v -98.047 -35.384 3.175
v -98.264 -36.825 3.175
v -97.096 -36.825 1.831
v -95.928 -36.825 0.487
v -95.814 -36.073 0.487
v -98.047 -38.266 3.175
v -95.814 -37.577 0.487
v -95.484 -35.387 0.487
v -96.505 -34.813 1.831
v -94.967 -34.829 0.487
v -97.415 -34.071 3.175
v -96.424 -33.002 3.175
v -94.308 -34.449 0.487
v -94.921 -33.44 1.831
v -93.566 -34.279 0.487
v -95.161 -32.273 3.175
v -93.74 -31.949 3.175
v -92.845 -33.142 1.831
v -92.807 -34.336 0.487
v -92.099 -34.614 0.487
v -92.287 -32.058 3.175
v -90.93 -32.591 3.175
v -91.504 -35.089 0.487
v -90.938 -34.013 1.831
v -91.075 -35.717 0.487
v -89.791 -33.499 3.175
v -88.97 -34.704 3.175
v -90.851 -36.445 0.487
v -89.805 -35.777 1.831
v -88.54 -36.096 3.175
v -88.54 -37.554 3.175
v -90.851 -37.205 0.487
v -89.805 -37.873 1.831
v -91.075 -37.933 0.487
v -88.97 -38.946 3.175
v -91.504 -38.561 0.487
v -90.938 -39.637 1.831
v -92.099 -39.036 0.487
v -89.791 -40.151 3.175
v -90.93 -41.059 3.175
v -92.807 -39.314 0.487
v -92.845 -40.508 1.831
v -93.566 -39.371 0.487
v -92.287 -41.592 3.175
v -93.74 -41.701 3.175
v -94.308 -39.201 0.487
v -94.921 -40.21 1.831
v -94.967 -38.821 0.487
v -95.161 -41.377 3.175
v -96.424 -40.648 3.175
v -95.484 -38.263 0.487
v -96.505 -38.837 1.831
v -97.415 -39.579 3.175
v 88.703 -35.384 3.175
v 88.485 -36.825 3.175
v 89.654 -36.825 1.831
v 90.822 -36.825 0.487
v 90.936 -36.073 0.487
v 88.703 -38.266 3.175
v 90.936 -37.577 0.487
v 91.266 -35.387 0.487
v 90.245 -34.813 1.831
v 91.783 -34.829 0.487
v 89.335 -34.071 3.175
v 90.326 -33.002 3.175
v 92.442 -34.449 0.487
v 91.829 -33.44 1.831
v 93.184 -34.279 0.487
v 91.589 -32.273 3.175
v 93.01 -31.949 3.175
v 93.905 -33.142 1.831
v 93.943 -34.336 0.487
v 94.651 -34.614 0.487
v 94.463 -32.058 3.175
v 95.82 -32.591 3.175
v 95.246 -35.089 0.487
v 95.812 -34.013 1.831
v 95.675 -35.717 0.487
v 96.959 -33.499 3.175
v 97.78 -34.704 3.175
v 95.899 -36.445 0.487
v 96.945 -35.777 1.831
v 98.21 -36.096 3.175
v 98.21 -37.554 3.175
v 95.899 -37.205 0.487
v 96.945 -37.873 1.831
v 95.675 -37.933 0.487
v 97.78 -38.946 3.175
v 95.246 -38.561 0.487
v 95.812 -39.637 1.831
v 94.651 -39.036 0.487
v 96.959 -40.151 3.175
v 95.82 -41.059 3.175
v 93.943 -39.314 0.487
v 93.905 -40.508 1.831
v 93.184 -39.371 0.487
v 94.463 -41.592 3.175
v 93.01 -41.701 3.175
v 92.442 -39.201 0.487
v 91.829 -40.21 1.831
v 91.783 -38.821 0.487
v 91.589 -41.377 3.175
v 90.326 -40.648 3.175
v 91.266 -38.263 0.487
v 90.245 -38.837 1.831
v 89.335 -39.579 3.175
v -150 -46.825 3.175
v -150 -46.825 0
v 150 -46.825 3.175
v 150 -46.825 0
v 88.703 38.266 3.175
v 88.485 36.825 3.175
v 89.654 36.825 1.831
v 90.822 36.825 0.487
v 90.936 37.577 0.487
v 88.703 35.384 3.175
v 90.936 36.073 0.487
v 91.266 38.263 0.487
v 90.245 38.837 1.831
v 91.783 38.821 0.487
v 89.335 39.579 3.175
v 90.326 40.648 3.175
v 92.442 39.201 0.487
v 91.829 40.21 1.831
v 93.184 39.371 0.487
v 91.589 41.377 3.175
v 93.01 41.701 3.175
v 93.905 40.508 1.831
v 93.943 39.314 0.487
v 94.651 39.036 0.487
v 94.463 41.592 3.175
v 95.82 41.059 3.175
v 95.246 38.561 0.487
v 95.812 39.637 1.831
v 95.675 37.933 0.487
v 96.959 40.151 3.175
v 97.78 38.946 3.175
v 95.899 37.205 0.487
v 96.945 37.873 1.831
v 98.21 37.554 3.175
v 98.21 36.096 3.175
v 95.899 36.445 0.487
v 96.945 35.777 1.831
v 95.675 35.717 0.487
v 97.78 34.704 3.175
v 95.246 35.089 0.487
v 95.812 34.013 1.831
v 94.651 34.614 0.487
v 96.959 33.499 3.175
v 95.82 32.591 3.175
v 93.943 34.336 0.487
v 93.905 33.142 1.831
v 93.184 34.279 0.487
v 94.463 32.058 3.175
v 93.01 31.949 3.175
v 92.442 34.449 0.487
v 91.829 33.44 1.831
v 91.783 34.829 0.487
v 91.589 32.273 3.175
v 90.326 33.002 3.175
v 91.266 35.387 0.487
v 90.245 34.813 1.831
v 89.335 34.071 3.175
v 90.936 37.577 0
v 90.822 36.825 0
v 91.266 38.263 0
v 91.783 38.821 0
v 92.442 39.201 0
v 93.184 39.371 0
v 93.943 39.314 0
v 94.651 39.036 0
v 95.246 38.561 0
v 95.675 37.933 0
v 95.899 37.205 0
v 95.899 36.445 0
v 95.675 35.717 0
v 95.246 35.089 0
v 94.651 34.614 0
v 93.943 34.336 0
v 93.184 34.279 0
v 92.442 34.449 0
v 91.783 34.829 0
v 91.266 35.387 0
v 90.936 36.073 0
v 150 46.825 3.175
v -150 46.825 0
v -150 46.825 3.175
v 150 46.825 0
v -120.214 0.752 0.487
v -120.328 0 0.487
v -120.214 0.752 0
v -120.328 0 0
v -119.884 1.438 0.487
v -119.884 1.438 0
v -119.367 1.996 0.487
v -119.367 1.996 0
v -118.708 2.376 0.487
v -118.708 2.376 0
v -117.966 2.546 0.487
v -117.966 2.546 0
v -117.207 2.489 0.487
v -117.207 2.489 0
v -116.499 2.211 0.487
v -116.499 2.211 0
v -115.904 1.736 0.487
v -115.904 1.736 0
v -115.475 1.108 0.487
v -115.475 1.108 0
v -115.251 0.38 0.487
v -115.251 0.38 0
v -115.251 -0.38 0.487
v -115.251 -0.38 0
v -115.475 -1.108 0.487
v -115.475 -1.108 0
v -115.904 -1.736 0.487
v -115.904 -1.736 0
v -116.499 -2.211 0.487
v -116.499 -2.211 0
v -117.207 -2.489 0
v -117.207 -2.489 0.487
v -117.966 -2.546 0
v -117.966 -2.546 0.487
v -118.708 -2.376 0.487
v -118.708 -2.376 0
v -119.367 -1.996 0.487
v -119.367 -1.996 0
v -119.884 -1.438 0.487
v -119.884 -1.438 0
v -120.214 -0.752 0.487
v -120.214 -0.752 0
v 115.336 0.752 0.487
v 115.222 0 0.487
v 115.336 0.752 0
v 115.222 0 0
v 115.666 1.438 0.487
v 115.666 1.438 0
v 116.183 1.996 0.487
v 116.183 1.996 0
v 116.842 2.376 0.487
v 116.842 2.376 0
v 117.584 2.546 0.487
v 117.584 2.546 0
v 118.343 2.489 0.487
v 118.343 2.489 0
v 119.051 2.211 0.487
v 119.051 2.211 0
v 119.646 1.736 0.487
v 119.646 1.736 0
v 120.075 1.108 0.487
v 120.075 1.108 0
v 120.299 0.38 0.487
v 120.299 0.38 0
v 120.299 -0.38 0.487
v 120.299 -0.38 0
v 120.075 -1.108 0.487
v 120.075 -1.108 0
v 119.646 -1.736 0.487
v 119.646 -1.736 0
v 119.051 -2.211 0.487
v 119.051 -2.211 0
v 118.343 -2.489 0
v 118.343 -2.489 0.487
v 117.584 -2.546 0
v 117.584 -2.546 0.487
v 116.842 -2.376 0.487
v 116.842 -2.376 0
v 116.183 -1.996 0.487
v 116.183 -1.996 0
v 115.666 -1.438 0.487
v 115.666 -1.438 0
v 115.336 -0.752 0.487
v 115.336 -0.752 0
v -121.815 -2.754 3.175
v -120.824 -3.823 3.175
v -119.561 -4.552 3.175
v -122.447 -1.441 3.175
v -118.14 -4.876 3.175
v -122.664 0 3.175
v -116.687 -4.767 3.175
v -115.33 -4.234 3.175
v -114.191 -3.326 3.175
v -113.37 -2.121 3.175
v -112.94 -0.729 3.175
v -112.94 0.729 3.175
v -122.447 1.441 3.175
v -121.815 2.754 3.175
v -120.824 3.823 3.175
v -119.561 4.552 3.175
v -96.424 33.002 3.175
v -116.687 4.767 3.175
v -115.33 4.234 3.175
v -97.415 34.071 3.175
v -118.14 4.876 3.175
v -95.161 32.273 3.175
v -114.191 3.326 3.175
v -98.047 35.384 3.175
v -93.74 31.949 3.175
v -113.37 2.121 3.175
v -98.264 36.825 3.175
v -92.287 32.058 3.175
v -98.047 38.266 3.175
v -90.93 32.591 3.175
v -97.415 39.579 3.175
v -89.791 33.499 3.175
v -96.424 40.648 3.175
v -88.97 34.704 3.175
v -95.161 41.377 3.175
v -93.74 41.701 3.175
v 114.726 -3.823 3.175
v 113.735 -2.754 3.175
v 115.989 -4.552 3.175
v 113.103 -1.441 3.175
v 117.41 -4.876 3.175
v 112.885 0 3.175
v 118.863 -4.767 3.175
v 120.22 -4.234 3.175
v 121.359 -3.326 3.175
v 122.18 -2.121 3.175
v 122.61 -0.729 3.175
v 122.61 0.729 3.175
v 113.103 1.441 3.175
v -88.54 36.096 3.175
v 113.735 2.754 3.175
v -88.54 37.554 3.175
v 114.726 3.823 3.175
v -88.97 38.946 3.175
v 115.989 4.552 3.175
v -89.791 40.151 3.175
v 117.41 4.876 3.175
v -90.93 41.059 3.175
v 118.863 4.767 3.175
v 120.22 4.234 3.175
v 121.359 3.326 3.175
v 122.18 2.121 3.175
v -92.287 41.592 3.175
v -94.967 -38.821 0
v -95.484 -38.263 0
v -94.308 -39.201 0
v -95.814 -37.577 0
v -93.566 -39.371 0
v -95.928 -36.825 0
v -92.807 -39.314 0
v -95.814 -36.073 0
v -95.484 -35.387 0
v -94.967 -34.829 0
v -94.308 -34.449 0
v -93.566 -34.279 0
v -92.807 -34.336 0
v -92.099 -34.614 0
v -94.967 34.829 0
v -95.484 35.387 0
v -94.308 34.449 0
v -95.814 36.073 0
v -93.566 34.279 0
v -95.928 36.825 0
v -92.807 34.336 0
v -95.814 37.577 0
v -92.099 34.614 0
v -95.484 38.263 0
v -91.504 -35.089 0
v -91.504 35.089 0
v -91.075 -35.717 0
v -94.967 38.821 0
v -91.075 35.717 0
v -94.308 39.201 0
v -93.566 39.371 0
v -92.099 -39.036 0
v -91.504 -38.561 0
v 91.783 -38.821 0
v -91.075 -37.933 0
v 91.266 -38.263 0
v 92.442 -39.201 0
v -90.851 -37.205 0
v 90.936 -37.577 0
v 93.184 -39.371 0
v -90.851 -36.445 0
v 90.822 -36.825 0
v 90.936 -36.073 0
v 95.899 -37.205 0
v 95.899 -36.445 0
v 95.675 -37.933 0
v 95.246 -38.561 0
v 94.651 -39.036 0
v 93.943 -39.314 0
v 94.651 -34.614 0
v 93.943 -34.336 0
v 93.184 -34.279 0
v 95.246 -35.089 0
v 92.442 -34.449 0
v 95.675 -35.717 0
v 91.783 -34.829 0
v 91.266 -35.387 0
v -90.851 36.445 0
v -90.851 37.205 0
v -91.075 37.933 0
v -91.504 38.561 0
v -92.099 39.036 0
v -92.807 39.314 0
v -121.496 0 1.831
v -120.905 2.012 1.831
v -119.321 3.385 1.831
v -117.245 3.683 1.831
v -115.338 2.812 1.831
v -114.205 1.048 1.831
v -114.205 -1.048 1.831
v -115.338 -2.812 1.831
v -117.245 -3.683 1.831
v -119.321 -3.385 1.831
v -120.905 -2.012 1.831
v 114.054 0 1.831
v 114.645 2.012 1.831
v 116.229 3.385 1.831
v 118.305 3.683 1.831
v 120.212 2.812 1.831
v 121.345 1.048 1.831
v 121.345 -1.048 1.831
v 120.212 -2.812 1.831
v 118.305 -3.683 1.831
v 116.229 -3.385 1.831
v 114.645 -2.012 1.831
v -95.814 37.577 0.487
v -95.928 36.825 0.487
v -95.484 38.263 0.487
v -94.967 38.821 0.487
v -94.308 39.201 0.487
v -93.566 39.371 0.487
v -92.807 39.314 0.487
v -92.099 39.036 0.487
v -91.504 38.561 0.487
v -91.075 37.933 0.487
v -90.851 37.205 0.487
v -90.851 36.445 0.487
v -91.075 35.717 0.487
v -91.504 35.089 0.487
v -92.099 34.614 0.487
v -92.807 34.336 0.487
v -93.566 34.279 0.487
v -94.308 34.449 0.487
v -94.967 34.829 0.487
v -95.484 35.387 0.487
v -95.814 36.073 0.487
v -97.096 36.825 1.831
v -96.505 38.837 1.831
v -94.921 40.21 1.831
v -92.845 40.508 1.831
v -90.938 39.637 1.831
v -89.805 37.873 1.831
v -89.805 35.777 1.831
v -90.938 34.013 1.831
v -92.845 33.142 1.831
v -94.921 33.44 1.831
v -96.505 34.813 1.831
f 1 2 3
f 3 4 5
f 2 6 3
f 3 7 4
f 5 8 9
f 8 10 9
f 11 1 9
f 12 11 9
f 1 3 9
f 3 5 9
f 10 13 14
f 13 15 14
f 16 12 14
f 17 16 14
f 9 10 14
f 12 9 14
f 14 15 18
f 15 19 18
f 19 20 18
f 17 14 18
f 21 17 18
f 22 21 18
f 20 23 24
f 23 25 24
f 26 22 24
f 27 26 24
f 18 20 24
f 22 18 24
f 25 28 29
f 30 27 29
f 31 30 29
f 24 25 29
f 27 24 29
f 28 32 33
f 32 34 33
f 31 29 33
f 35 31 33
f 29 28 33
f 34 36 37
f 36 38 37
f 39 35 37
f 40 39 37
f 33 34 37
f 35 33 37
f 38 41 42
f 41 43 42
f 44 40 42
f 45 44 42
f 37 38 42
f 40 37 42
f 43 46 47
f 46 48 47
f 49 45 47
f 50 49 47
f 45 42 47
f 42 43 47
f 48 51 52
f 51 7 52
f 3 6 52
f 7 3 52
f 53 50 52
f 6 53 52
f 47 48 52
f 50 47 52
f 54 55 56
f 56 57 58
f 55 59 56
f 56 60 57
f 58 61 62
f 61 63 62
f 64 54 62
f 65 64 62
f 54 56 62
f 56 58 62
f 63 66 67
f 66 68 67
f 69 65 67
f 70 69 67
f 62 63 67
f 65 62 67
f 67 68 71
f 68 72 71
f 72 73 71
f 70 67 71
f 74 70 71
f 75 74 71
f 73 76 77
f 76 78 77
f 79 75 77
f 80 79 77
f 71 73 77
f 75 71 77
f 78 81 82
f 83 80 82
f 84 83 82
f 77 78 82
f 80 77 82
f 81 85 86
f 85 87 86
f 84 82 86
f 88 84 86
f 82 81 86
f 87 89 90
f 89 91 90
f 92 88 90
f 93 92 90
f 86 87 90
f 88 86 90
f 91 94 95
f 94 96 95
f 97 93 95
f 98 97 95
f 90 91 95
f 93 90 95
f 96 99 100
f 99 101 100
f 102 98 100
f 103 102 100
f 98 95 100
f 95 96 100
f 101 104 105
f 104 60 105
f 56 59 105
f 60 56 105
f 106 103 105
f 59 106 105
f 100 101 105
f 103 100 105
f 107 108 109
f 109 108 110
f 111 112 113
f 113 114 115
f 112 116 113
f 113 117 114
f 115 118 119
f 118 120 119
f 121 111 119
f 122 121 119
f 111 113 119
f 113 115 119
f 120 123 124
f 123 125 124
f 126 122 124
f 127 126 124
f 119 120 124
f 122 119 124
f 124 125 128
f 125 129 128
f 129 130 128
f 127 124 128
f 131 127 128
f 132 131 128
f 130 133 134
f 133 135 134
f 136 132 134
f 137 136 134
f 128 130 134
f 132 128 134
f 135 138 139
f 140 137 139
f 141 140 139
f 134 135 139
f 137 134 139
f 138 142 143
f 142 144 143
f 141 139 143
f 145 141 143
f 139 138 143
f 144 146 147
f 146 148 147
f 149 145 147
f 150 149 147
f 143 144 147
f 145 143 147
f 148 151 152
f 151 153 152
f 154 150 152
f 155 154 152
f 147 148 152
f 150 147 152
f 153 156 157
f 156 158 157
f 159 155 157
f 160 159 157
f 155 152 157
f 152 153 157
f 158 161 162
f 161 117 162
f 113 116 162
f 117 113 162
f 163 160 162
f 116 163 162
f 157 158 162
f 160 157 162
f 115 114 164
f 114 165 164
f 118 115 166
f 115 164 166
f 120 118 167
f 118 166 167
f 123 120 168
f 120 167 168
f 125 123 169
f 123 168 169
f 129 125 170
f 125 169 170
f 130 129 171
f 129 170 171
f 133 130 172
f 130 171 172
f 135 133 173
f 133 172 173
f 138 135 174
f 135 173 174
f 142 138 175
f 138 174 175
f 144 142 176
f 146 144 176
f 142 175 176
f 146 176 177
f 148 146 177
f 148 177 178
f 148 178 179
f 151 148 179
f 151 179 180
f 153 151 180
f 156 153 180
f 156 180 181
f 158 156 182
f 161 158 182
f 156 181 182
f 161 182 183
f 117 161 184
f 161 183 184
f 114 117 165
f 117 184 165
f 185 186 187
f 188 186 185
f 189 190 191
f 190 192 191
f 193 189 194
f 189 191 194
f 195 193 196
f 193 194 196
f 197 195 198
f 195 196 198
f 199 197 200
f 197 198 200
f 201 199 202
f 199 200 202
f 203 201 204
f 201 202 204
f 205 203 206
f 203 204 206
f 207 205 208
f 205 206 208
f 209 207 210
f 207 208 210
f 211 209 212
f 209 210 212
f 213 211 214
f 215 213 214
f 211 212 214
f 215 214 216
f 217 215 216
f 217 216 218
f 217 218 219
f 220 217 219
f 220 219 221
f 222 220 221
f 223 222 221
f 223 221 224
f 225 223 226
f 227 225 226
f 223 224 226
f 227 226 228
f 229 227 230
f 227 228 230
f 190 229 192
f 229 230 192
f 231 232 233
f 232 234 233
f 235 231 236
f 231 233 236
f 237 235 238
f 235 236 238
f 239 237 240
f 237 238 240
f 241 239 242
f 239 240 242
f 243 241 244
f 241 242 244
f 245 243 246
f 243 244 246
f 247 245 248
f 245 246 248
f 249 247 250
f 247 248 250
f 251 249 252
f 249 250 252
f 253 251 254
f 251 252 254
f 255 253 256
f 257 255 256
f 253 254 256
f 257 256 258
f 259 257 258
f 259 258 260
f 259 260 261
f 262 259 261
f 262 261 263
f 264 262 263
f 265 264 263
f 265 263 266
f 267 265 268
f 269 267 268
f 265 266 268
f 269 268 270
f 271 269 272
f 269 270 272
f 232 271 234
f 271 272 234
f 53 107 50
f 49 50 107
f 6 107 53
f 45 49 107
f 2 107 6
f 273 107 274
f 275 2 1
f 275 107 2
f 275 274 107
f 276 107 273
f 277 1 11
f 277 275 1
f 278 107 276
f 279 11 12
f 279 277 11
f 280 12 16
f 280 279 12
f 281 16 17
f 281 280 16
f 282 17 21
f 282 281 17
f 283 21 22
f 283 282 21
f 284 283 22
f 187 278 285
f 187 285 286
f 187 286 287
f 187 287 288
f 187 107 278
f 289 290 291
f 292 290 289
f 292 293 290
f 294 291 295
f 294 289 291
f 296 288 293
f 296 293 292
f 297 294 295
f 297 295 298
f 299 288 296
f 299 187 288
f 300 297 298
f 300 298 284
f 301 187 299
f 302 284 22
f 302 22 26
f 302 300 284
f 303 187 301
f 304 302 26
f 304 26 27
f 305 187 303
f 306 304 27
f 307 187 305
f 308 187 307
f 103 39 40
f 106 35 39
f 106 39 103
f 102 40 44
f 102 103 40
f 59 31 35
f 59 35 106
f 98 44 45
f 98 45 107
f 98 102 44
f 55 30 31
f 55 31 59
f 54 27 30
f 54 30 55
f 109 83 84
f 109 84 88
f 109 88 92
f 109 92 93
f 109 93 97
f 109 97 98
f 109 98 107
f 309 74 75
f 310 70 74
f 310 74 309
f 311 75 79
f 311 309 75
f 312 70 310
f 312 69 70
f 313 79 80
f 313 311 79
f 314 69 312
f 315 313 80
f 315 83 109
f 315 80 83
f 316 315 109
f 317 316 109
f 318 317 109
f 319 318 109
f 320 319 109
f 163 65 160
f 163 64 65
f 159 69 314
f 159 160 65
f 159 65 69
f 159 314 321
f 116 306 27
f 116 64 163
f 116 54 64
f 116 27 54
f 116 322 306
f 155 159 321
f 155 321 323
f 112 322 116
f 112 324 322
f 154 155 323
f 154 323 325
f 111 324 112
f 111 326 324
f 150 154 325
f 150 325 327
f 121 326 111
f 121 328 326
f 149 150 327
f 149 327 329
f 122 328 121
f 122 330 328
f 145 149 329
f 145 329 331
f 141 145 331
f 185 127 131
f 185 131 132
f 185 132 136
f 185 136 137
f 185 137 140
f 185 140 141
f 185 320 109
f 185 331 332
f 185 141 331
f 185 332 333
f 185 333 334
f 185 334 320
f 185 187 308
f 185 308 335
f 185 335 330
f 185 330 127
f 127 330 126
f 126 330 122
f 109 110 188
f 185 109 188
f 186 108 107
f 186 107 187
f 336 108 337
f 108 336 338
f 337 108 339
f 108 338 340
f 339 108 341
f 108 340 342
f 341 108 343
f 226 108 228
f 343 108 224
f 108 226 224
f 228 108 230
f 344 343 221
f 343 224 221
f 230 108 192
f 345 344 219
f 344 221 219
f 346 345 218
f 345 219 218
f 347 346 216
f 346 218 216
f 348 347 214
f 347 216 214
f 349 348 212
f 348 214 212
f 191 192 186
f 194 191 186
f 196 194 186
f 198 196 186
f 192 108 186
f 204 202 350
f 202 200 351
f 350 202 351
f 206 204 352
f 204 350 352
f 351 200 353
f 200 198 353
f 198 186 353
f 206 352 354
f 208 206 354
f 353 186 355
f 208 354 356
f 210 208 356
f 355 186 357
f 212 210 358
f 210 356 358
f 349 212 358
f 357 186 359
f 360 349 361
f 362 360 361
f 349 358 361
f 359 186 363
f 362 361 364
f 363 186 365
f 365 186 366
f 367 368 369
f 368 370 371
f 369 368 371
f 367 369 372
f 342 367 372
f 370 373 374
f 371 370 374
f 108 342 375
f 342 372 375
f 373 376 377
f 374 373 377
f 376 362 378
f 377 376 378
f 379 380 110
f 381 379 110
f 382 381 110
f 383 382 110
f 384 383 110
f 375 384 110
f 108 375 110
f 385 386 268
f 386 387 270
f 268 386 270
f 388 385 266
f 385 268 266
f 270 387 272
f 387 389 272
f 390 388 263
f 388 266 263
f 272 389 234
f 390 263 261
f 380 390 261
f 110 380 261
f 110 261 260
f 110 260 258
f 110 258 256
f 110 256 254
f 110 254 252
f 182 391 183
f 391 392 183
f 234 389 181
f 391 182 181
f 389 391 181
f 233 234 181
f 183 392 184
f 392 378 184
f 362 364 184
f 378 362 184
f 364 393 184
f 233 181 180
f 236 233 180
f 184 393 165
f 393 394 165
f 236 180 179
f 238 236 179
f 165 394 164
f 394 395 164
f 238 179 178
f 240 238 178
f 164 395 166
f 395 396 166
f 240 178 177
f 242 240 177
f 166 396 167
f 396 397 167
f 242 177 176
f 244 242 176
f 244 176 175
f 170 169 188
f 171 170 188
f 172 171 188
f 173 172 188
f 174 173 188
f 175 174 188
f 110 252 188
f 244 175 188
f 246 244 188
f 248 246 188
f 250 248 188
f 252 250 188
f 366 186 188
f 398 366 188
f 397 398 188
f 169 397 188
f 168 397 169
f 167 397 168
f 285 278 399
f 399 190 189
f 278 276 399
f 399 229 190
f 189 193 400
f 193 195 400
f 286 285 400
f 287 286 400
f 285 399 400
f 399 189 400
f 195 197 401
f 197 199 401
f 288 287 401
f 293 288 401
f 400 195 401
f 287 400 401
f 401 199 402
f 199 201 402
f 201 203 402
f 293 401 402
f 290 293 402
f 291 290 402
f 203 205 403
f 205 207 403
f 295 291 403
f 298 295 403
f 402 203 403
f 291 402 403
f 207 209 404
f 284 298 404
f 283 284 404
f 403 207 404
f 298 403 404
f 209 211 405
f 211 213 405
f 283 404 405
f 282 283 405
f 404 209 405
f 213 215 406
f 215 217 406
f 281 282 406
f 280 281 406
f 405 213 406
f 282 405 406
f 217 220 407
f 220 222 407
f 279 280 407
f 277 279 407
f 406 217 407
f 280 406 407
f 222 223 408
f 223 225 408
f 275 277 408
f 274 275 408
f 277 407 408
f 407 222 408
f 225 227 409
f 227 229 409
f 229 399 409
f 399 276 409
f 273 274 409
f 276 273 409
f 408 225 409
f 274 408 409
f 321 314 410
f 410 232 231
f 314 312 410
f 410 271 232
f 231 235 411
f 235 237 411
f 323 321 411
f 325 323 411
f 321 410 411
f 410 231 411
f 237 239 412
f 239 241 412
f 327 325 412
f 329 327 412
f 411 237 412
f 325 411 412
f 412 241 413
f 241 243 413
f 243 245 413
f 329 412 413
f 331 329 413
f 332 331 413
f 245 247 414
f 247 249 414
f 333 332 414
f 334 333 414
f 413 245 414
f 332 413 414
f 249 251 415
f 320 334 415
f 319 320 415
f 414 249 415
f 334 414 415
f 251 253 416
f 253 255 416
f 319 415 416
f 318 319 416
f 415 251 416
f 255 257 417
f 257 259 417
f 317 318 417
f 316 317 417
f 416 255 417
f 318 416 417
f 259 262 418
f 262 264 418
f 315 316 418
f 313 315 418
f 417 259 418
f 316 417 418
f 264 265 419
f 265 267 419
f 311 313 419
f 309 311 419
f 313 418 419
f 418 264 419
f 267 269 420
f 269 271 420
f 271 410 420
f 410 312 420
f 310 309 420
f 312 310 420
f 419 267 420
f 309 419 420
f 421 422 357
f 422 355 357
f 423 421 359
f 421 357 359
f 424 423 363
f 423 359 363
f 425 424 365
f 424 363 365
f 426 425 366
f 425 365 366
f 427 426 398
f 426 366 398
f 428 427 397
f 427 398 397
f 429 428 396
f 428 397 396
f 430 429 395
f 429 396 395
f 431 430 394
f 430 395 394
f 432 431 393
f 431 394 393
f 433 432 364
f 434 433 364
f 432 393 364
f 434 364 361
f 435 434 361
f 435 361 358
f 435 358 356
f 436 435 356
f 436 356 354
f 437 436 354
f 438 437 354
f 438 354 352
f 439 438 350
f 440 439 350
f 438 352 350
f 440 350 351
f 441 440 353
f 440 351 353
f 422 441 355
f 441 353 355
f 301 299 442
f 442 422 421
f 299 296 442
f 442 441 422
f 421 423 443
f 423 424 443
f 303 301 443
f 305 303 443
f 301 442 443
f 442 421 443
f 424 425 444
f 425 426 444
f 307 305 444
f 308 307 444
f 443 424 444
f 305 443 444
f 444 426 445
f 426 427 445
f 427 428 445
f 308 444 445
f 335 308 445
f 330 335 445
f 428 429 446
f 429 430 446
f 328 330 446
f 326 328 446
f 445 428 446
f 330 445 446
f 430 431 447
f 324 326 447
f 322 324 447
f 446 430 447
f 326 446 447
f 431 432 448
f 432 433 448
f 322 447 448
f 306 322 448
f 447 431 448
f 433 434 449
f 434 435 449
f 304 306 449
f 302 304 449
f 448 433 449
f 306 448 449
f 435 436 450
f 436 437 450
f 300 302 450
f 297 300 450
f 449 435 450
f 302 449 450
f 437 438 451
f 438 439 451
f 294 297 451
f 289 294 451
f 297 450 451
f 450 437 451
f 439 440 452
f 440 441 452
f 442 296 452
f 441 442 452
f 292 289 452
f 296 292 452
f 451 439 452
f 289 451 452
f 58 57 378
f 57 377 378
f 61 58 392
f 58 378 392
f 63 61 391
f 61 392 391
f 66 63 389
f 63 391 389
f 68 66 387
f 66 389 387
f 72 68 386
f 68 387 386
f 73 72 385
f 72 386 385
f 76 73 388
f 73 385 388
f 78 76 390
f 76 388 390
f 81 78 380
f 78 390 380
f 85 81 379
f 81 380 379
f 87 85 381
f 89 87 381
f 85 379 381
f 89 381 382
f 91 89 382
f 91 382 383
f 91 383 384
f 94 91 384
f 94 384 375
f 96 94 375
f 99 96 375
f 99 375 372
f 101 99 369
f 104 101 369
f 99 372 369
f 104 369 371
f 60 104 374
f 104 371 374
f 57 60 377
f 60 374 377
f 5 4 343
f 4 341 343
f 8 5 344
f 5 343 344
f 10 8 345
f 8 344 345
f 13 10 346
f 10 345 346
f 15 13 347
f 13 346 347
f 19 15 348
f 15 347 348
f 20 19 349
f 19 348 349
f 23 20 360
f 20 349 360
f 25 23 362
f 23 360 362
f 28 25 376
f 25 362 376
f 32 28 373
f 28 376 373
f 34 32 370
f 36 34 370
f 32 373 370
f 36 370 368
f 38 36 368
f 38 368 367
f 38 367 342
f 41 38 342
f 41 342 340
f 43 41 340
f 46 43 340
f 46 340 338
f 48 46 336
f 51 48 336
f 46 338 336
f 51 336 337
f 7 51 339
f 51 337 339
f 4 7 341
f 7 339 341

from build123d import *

# Parameters (mm, degrees)
SKETCH1_W                                       = 299.999999694
SKETCH1_H                                       = 93.649999898
BOSS_EXTRUDE1_DEPTH                             = 3.175
CSK_FOR_10_FLAT_HEAD_MACHINE_SCREW1_D           = 5.1054
CSK_FOR_10_FLAT_HEAD_MACHINE_SCREW1_DEPTH       = 4.826
CSK_FOR_10_FLAT_HEAD_MACHINE_SCREW1_CSINK_D     = 9.779
CSK_FOR_10_FLAT_HEAD_MACHINE_SCREW1_CSINK_ANGLE = 82
CSK_FOR_10_FLAT_HEAD_MACHINE_SCREW1_TIP         = 1.533816902
CSK_FOR_10_FLAT_HEAD_MACHINE_SCREW2_D           = 5.1054
CSK_FOR_10_FLAT_HEAD_MACHINE_SCREW2_DEPTH       = 4.826
CSK_FOR_10_FLAT_HEAD_MACHINE_SCREW2_CSINK_D     = 9.779
CSK_FOR_10_FLAT_HEAD_MACHINE_SCREW2_CSINK_ANGLE = 82
CSK_FOR_10_FLAT_HEAD_MACHINE_SCREW2_TIP         = 1.533816902


with BuildPart() as part:
    # Sketch1 → Boss-Extrude1 (new body)
    with BuildSketch(Plane.XY):
        Rectangle(SKETCH1_W, SKETCH1_H)
    extrude(amount=BOSS_EXTRUDE1_DEPTH)

    # CSK for #10 Flat Head Machine Screw1
    with Locations(Plane.XY.offset(3.175)):
        with Locations((-93.374999847, 36.824999949), (93.374999847, 36.824999949), (93.374999847, -36.824999949), (-93.374999847, -36.824999949)):
            CounterSinkHole(CSK_FOR_10_FLAT_HEAD_MACHINE_SCREW1_D / 2, CSK_FOR_10_FLAT_HEAD_MACHINE_SCREW1_CSINK_D / 2, depth=CSK_FOR_10_FLAT_HEAD_MACHINE_SCREW1_DEPTH, counter_sink_angle=CSK_FOR_10_FLAT_HEAD_MACHINE_SCREW1_CSINK_ANGLE)
            with Locations((0, 0, -(CSK_FOR_10_FLAT_HEAD_MACHINE_SCREW1_DEPTH + CSK_FOR_10_FLAT_HEAD_MACHINE_SCREW1_TIP / 2))):  # 118° drill point
                Cone(0, CSK_FOR_10_FLAT_HEAD_MACHINE_SCREW1_D / 2, CSK_FOR_10_FLAT_HEAD_MACHINE_SCREW1_TIP, mode=Mode.SUBTRACT)

    # CSK for #10 Flat Head Machine Screw2
    with Locations(Plane.XY.offset(3.175)):
        with Locations((-117.774999847, 0), (117.774999847, 0)):
            CounterSinkHole(CSK_FOR_10_FLAT_HEAD_MACHINE_SCREW2_D / 2, CSK_FOR_10_FLAT_HEAD_MACHINE_SCREW2_CSINK_D / 2, depth=CSK_FOR_10_FLAT_HEAD_MACHINE_SCREW2_DEPTH, counter_sink_angle=CSK_FOR_10_FLAT_HEAD_MACHINE_SCREW2_CSINK_ANGLE)
            with Locations((0, 0, -(CSK_FOR_10_FLAT_HEAD_MACHINE_SCREW2_DEPTH + CSK_FOR_10_FLAT_HEAD_MACHINE_SCREW2_TIP / 2))):  # 118° drill point
                Cone(0, CSK_FOR_10_FLAT_HEAD_MACHINE_SCREW2_D / 2, CSK_FOR_10_FLAT_HEAD_MACHINE_SCREW2_TIP, mode=Mode.SUBTRACT)


solid = part.part
